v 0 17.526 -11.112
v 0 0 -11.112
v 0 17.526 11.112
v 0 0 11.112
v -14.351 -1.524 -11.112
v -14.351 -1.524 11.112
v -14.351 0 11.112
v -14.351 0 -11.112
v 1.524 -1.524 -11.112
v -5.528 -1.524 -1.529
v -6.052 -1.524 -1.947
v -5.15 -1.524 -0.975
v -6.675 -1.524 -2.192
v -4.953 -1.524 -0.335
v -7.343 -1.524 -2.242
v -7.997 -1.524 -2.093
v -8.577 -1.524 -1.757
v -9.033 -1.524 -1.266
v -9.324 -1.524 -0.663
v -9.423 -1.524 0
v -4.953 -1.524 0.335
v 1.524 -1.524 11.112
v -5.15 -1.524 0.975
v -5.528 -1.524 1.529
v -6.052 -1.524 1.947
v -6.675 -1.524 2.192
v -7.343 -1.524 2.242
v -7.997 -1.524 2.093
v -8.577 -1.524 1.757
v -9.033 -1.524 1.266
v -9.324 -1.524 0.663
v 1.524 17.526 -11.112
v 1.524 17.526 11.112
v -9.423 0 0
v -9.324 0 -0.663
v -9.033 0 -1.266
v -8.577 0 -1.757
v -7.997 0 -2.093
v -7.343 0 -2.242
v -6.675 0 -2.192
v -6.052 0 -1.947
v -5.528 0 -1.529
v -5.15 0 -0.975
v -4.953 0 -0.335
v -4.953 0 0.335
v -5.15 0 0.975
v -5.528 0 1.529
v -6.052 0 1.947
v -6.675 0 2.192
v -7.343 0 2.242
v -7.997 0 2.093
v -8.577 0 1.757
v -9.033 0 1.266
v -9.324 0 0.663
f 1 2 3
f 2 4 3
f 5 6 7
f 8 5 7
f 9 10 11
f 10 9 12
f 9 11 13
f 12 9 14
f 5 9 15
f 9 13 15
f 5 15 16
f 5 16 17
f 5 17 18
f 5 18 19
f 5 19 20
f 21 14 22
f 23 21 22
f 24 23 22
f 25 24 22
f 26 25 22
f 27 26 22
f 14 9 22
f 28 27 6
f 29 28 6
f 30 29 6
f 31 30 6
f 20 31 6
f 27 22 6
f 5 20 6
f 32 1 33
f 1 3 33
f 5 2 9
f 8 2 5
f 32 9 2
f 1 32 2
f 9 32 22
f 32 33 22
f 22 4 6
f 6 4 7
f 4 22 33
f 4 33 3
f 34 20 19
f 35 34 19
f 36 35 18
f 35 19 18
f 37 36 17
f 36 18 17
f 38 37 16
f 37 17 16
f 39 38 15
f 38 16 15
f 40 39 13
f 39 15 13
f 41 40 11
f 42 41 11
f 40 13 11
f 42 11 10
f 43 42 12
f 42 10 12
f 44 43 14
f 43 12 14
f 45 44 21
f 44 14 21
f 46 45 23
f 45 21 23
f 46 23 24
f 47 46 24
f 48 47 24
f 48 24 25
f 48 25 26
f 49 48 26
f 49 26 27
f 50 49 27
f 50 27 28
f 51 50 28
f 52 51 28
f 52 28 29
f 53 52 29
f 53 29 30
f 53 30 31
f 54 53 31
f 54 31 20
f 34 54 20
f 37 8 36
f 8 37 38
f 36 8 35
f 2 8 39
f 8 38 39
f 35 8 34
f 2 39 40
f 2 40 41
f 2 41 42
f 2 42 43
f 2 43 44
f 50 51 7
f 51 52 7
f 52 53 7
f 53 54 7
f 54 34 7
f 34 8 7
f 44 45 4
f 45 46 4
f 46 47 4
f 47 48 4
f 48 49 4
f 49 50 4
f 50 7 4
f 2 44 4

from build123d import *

# Parameters (mm, degrees)
BOSS_EXTRUDE1_DEPTH       = 11.1125
F_8_CLEARANCE_HOLE1_D     = 4.4958
F_8_CLEARANCE_HOLE1_DEPTH = 31.75
F_8_CLEARANCE_HOLE1_TIP   = 1.350674586


with BuildPart() as part:
    # Sketch1 → Boss-Extrude1 (new, symmetric)
    with BuildSketch(Plane.XY):
        Polygon((-14.351, 0), (0, 0), (0, 17.526), (1.524, 17.526), (1.524, -1.524), (-14.351, -1.524), align=None)
    extrude(amount=BOSS_EXTRUDE1_DEPTH, both=True)

    # #8 Clearance Hole1
    with Locations(Plane(origin=(0, 0, 0), x_dir=(1, 0, 0), z_dir=(0, 1, 0))):
        with Locations((-7.1755, 0)):
            Hole(F_8_CLEARANCE_HOLE1_D / 2, depth=F_8_CLEARANCE_HOLE1_DEPTH)
            with Locations((0, 0, -(F_8_CLEARANCE_HOLE1_DEPTH + F_8_CLEARANCE_HOLE1_TIP / 2))):  # 118° drill point
                Cone(0, F_8_CLEARANCE_HOLE1_D / 2, F_8_CLEARANCE_HOLE1_TIP, mode=Mode.SUBTRACT)


solid = part.part
